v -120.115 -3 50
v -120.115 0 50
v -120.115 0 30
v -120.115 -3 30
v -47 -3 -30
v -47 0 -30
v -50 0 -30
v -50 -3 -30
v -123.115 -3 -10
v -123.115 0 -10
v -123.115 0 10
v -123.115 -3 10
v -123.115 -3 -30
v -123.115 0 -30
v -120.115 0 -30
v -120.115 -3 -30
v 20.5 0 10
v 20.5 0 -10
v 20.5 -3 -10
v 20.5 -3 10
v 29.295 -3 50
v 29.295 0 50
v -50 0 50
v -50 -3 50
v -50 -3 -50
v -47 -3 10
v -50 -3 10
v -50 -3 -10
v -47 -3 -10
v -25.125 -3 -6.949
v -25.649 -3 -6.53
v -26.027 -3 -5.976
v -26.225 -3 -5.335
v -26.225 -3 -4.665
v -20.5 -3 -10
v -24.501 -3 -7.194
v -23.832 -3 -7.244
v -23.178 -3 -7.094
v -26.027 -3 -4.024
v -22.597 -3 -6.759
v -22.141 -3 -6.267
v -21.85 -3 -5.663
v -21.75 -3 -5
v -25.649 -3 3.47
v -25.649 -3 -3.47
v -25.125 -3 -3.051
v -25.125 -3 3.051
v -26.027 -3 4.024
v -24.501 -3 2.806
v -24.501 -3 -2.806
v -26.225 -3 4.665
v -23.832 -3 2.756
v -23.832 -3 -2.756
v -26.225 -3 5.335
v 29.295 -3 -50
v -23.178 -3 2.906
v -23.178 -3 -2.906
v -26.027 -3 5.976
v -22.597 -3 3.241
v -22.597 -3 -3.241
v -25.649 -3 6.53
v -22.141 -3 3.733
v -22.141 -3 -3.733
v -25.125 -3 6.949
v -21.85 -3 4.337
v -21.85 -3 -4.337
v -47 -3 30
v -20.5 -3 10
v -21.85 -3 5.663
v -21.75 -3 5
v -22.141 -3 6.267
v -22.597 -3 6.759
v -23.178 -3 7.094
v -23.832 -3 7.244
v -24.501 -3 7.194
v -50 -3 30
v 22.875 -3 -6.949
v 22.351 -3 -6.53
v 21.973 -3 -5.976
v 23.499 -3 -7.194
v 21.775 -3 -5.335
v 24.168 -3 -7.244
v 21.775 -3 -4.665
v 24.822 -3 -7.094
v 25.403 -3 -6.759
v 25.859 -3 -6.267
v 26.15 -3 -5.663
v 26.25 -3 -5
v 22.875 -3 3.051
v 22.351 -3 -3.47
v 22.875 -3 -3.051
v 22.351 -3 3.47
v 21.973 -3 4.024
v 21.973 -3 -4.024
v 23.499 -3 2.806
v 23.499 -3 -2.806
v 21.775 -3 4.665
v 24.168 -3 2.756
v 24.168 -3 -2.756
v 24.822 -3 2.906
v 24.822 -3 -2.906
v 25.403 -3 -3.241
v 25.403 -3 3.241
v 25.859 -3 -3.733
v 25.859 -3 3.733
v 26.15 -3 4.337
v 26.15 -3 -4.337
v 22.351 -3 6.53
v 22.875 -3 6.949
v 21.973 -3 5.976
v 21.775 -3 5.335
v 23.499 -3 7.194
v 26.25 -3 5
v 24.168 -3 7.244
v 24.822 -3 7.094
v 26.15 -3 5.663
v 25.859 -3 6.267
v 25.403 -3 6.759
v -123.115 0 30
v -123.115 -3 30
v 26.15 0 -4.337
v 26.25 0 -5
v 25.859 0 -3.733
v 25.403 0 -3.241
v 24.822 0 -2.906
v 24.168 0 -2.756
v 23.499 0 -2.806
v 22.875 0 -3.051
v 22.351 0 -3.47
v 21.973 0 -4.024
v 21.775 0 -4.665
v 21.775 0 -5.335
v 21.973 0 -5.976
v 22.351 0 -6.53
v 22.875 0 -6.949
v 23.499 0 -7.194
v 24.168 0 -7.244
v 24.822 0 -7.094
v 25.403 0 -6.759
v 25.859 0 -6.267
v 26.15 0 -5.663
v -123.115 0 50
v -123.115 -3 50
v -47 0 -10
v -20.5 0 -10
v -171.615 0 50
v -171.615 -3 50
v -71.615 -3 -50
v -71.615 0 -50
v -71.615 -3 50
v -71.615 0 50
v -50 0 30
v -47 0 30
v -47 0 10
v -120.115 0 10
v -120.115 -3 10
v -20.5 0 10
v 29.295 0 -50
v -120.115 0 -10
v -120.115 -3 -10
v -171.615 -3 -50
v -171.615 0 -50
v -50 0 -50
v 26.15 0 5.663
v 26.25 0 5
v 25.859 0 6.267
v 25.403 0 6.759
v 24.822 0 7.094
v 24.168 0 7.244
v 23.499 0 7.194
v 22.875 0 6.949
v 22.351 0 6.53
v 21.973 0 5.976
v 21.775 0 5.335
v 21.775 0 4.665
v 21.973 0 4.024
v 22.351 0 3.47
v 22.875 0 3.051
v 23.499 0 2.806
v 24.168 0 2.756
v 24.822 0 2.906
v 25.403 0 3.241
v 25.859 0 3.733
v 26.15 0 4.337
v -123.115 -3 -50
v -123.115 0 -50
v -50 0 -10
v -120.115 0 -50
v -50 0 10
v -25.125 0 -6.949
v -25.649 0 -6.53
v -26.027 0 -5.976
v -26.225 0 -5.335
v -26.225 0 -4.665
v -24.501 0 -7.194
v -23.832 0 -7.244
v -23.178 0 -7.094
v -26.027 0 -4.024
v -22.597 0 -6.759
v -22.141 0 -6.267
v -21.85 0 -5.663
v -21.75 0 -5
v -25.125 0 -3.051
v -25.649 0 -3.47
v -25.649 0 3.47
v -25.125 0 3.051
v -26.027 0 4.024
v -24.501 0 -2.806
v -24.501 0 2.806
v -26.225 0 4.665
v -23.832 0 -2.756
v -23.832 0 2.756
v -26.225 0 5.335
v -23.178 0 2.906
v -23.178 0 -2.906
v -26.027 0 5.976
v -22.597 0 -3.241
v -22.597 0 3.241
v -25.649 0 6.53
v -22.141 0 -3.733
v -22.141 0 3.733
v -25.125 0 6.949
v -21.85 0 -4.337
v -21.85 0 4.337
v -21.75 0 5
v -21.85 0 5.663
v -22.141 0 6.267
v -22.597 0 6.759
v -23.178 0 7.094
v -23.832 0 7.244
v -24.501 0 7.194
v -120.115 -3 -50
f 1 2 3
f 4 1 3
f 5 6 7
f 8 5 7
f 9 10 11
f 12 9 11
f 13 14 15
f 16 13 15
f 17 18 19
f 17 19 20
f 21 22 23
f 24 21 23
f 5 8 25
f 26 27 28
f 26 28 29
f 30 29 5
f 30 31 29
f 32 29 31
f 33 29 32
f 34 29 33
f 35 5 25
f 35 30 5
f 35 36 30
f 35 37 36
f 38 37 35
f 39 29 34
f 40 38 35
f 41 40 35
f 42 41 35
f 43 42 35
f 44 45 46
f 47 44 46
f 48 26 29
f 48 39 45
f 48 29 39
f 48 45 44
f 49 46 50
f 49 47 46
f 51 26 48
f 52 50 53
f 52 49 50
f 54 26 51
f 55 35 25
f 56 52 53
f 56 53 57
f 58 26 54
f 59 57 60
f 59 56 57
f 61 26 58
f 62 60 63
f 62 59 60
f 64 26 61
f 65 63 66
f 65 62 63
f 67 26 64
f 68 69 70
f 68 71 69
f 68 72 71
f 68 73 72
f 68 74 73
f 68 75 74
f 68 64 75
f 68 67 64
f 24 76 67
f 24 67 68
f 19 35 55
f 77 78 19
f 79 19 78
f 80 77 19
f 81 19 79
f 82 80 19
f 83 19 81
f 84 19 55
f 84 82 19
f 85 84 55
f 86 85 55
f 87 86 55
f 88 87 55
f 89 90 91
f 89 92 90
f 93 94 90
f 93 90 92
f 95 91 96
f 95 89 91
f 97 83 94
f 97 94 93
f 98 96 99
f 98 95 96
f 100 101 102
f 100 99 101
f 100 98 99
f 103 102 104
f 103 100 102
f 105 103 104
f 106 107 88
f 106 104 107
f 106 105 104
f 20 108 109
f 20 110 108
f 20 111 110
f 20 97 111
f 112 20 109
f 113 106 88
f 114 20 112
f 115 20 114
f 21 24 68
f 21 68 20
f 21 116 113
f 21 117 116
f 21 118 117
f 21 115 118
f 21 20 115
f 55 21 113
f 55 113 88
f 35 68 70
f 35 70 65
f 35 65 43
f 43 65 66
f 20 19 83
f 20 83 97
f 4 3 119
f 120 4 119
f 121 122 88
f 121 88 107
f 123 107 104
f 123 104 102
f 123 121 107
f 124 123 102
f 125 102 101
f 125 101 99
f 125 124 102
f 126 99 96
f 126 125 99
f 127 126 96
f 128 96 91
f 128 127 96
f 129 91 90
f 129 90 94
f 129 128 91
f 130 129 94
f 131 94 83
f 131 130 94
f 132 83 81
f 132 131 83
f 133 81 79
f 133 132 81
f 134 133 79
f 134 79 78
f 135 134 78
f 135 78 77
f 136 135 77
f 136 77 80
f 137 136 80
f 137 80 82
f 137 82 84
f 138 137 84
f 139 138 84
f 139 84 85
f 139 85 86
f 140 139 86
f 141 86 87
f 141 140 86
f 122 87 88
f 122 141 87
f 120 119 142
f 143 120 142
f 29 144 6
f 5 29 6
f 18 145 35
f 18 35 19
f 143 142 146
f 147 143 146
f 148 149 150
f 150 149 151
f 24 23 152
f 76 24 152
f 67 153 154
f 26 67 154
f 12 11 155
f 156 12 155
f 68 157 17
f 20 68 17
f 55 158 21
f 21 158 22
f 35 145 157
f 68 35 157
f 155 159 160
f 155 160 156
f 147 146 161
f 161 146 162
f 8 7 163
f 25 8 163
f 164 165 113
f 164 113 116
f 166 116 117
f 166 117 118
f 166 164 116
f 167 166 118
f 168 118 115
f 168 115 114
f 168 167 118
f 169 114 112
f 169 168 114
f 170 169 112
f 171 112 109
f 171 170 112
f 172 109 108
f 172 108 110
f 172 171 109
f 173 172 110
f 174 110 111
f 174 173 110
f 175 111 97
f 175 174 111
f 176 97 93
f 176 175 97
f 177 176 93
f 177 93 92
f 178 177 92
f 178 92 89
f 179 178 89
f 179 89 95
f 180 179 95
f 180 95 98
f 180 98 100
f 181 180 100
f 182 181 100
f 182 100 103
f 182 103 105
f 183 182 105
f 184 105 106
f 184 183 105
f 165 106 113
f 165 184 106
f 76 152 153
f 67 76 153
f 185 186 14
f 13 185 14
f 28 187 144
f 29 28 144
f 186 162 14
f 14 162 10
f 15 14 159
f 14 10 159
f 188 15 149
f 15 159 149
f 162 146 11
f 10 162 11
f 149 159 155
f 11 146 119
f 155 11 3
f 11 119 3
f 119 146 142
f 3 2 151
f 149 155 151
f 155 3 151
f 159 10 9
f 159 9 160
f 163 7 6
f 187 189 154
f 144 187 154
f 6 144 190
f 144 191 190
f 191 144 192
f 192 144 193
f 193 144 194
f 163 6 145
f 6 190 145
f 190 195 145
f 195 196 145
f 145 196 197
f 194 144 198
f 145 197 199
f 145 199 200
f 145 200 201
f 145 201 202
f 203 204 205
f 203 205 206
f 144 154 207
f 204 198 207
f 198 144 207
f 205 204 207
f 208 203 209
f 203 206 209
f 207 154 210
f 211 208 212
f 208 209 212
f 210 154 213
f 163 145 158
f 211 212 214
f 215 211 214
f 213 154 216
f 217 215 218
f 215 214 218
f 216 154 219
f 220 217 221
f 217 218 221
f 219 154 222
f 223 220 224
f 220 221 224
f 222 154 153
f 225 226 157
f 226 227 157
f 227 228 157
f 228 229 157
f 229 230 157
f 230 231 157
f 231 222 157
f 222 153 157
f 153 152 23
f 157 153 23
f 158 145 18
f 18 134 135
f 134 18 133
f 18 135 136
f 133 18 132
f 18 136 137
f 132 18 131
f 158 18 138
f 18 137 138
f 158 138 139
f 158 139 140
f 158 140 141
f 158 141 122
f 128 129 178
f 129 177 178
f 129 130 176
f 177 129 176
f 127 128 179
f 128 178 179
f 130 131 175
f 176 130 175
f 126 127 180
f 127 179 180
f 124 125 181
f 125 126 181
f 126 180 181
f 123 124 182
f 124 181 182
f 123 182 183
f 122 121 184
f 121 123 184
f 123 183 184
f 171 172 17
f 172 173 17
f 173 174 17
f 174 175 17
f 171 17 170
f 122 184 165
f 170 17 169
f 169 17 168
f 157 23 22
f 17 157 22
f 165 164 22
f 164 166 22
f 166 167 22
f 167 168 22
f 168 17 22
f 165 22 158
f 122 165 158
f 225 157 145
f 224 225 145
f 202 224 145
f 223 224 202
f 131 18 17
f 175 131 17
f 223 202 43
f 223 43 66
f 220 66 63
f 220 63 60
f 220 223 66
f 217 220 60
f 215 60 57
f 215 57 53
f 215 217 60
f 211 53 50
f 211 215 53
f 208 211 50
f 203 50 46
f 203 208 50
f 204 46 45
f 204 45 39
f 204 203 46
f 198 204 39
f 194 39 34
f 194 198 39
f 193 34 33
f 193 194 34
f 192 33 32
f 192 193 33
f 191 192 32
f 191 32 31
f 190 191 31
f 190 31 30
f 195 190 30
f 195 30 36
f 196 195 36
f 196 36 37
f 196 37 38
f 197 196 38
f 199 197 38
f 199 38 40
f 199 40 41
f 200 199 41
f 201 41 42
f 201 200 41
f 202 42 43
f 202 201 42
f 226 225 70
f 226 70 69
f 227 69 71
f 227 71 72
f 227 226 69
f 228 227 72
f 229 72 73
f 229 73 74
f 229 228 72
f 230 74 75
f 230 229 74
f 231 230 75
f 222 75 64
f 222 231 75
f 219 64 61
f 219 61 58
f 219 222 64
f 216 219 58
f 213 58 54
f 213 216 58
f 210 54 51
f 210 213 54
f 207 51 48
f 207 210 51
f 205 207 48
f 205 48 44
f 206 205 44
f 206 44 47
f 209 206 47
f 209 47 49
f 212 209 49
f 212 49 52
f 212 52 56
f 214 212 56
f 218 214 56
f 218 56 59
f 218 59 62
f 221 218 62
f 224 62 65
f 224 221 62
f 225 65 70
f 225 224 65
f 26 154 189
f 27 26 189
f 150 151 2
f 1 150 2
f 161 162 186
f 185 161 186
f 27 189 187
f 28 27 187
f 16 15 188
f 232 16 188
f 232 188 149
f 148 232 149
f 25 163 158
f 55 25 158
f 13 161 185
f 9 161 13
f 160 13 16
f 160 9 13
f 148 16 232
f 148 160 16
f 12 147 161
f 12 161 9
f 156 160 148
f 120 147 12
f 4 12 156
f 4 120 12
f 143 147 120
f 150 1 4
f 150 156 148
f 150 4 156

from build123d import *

# Parameters (mm, degrees)
F0_R     = 2.25
F0_W     = 41
F0_H     = 20
F0_W_2   = 3
F1_DEPTH = 3


with BuildPart() as f1:
    # F0 (on Front) → F1 (new body)
    with BuildSketch(Plane.XZ):
        Polygon((29.294718, 50), (-50, 50), (-50, 30), (-47, 30), (-47, 10), (-50, 10), (-50, -10), (-47, -10), (-47, -30), (-50, -30), (-50, -50), (29.294718, -50), align=None)
        with Locations((-24, -5)):
            Circle(F0_R, mode=Mode.SUBTRACT)
        with Locations((24, -5)):
            Circle(F0_R, mode=Mode.SUBTRACT)
        with Locations((-24, 5)):
            Circle(F0_R, mode=Mode.SUBTRACT)
        Rectangle(F0_W, F0_H, mode=Mode.SUBTRACT)
        with Locations((24, 5)):
            Circle(F0_R, mode=Mode.SUBTRACT)
        Polygon((-71.615496, -50), (-71.615496, 50), (-120.115496, 50), (-120.115496, 30), (-123.115496, 30), (-123.115496, 50), (-171.615496, 50), (-171.615496, -50), (-123.115496, -50), (-123.115496, -30), (-120.115496, -30), (-120.115496, -50), align=None)
        with Locations((-121.615496, 0)):
            Rectangle(F0_W_2, F0_H, mode=Mode.SUBTRACT)
    extrude(amount=F1_DEPTH)


solid = f1.part
